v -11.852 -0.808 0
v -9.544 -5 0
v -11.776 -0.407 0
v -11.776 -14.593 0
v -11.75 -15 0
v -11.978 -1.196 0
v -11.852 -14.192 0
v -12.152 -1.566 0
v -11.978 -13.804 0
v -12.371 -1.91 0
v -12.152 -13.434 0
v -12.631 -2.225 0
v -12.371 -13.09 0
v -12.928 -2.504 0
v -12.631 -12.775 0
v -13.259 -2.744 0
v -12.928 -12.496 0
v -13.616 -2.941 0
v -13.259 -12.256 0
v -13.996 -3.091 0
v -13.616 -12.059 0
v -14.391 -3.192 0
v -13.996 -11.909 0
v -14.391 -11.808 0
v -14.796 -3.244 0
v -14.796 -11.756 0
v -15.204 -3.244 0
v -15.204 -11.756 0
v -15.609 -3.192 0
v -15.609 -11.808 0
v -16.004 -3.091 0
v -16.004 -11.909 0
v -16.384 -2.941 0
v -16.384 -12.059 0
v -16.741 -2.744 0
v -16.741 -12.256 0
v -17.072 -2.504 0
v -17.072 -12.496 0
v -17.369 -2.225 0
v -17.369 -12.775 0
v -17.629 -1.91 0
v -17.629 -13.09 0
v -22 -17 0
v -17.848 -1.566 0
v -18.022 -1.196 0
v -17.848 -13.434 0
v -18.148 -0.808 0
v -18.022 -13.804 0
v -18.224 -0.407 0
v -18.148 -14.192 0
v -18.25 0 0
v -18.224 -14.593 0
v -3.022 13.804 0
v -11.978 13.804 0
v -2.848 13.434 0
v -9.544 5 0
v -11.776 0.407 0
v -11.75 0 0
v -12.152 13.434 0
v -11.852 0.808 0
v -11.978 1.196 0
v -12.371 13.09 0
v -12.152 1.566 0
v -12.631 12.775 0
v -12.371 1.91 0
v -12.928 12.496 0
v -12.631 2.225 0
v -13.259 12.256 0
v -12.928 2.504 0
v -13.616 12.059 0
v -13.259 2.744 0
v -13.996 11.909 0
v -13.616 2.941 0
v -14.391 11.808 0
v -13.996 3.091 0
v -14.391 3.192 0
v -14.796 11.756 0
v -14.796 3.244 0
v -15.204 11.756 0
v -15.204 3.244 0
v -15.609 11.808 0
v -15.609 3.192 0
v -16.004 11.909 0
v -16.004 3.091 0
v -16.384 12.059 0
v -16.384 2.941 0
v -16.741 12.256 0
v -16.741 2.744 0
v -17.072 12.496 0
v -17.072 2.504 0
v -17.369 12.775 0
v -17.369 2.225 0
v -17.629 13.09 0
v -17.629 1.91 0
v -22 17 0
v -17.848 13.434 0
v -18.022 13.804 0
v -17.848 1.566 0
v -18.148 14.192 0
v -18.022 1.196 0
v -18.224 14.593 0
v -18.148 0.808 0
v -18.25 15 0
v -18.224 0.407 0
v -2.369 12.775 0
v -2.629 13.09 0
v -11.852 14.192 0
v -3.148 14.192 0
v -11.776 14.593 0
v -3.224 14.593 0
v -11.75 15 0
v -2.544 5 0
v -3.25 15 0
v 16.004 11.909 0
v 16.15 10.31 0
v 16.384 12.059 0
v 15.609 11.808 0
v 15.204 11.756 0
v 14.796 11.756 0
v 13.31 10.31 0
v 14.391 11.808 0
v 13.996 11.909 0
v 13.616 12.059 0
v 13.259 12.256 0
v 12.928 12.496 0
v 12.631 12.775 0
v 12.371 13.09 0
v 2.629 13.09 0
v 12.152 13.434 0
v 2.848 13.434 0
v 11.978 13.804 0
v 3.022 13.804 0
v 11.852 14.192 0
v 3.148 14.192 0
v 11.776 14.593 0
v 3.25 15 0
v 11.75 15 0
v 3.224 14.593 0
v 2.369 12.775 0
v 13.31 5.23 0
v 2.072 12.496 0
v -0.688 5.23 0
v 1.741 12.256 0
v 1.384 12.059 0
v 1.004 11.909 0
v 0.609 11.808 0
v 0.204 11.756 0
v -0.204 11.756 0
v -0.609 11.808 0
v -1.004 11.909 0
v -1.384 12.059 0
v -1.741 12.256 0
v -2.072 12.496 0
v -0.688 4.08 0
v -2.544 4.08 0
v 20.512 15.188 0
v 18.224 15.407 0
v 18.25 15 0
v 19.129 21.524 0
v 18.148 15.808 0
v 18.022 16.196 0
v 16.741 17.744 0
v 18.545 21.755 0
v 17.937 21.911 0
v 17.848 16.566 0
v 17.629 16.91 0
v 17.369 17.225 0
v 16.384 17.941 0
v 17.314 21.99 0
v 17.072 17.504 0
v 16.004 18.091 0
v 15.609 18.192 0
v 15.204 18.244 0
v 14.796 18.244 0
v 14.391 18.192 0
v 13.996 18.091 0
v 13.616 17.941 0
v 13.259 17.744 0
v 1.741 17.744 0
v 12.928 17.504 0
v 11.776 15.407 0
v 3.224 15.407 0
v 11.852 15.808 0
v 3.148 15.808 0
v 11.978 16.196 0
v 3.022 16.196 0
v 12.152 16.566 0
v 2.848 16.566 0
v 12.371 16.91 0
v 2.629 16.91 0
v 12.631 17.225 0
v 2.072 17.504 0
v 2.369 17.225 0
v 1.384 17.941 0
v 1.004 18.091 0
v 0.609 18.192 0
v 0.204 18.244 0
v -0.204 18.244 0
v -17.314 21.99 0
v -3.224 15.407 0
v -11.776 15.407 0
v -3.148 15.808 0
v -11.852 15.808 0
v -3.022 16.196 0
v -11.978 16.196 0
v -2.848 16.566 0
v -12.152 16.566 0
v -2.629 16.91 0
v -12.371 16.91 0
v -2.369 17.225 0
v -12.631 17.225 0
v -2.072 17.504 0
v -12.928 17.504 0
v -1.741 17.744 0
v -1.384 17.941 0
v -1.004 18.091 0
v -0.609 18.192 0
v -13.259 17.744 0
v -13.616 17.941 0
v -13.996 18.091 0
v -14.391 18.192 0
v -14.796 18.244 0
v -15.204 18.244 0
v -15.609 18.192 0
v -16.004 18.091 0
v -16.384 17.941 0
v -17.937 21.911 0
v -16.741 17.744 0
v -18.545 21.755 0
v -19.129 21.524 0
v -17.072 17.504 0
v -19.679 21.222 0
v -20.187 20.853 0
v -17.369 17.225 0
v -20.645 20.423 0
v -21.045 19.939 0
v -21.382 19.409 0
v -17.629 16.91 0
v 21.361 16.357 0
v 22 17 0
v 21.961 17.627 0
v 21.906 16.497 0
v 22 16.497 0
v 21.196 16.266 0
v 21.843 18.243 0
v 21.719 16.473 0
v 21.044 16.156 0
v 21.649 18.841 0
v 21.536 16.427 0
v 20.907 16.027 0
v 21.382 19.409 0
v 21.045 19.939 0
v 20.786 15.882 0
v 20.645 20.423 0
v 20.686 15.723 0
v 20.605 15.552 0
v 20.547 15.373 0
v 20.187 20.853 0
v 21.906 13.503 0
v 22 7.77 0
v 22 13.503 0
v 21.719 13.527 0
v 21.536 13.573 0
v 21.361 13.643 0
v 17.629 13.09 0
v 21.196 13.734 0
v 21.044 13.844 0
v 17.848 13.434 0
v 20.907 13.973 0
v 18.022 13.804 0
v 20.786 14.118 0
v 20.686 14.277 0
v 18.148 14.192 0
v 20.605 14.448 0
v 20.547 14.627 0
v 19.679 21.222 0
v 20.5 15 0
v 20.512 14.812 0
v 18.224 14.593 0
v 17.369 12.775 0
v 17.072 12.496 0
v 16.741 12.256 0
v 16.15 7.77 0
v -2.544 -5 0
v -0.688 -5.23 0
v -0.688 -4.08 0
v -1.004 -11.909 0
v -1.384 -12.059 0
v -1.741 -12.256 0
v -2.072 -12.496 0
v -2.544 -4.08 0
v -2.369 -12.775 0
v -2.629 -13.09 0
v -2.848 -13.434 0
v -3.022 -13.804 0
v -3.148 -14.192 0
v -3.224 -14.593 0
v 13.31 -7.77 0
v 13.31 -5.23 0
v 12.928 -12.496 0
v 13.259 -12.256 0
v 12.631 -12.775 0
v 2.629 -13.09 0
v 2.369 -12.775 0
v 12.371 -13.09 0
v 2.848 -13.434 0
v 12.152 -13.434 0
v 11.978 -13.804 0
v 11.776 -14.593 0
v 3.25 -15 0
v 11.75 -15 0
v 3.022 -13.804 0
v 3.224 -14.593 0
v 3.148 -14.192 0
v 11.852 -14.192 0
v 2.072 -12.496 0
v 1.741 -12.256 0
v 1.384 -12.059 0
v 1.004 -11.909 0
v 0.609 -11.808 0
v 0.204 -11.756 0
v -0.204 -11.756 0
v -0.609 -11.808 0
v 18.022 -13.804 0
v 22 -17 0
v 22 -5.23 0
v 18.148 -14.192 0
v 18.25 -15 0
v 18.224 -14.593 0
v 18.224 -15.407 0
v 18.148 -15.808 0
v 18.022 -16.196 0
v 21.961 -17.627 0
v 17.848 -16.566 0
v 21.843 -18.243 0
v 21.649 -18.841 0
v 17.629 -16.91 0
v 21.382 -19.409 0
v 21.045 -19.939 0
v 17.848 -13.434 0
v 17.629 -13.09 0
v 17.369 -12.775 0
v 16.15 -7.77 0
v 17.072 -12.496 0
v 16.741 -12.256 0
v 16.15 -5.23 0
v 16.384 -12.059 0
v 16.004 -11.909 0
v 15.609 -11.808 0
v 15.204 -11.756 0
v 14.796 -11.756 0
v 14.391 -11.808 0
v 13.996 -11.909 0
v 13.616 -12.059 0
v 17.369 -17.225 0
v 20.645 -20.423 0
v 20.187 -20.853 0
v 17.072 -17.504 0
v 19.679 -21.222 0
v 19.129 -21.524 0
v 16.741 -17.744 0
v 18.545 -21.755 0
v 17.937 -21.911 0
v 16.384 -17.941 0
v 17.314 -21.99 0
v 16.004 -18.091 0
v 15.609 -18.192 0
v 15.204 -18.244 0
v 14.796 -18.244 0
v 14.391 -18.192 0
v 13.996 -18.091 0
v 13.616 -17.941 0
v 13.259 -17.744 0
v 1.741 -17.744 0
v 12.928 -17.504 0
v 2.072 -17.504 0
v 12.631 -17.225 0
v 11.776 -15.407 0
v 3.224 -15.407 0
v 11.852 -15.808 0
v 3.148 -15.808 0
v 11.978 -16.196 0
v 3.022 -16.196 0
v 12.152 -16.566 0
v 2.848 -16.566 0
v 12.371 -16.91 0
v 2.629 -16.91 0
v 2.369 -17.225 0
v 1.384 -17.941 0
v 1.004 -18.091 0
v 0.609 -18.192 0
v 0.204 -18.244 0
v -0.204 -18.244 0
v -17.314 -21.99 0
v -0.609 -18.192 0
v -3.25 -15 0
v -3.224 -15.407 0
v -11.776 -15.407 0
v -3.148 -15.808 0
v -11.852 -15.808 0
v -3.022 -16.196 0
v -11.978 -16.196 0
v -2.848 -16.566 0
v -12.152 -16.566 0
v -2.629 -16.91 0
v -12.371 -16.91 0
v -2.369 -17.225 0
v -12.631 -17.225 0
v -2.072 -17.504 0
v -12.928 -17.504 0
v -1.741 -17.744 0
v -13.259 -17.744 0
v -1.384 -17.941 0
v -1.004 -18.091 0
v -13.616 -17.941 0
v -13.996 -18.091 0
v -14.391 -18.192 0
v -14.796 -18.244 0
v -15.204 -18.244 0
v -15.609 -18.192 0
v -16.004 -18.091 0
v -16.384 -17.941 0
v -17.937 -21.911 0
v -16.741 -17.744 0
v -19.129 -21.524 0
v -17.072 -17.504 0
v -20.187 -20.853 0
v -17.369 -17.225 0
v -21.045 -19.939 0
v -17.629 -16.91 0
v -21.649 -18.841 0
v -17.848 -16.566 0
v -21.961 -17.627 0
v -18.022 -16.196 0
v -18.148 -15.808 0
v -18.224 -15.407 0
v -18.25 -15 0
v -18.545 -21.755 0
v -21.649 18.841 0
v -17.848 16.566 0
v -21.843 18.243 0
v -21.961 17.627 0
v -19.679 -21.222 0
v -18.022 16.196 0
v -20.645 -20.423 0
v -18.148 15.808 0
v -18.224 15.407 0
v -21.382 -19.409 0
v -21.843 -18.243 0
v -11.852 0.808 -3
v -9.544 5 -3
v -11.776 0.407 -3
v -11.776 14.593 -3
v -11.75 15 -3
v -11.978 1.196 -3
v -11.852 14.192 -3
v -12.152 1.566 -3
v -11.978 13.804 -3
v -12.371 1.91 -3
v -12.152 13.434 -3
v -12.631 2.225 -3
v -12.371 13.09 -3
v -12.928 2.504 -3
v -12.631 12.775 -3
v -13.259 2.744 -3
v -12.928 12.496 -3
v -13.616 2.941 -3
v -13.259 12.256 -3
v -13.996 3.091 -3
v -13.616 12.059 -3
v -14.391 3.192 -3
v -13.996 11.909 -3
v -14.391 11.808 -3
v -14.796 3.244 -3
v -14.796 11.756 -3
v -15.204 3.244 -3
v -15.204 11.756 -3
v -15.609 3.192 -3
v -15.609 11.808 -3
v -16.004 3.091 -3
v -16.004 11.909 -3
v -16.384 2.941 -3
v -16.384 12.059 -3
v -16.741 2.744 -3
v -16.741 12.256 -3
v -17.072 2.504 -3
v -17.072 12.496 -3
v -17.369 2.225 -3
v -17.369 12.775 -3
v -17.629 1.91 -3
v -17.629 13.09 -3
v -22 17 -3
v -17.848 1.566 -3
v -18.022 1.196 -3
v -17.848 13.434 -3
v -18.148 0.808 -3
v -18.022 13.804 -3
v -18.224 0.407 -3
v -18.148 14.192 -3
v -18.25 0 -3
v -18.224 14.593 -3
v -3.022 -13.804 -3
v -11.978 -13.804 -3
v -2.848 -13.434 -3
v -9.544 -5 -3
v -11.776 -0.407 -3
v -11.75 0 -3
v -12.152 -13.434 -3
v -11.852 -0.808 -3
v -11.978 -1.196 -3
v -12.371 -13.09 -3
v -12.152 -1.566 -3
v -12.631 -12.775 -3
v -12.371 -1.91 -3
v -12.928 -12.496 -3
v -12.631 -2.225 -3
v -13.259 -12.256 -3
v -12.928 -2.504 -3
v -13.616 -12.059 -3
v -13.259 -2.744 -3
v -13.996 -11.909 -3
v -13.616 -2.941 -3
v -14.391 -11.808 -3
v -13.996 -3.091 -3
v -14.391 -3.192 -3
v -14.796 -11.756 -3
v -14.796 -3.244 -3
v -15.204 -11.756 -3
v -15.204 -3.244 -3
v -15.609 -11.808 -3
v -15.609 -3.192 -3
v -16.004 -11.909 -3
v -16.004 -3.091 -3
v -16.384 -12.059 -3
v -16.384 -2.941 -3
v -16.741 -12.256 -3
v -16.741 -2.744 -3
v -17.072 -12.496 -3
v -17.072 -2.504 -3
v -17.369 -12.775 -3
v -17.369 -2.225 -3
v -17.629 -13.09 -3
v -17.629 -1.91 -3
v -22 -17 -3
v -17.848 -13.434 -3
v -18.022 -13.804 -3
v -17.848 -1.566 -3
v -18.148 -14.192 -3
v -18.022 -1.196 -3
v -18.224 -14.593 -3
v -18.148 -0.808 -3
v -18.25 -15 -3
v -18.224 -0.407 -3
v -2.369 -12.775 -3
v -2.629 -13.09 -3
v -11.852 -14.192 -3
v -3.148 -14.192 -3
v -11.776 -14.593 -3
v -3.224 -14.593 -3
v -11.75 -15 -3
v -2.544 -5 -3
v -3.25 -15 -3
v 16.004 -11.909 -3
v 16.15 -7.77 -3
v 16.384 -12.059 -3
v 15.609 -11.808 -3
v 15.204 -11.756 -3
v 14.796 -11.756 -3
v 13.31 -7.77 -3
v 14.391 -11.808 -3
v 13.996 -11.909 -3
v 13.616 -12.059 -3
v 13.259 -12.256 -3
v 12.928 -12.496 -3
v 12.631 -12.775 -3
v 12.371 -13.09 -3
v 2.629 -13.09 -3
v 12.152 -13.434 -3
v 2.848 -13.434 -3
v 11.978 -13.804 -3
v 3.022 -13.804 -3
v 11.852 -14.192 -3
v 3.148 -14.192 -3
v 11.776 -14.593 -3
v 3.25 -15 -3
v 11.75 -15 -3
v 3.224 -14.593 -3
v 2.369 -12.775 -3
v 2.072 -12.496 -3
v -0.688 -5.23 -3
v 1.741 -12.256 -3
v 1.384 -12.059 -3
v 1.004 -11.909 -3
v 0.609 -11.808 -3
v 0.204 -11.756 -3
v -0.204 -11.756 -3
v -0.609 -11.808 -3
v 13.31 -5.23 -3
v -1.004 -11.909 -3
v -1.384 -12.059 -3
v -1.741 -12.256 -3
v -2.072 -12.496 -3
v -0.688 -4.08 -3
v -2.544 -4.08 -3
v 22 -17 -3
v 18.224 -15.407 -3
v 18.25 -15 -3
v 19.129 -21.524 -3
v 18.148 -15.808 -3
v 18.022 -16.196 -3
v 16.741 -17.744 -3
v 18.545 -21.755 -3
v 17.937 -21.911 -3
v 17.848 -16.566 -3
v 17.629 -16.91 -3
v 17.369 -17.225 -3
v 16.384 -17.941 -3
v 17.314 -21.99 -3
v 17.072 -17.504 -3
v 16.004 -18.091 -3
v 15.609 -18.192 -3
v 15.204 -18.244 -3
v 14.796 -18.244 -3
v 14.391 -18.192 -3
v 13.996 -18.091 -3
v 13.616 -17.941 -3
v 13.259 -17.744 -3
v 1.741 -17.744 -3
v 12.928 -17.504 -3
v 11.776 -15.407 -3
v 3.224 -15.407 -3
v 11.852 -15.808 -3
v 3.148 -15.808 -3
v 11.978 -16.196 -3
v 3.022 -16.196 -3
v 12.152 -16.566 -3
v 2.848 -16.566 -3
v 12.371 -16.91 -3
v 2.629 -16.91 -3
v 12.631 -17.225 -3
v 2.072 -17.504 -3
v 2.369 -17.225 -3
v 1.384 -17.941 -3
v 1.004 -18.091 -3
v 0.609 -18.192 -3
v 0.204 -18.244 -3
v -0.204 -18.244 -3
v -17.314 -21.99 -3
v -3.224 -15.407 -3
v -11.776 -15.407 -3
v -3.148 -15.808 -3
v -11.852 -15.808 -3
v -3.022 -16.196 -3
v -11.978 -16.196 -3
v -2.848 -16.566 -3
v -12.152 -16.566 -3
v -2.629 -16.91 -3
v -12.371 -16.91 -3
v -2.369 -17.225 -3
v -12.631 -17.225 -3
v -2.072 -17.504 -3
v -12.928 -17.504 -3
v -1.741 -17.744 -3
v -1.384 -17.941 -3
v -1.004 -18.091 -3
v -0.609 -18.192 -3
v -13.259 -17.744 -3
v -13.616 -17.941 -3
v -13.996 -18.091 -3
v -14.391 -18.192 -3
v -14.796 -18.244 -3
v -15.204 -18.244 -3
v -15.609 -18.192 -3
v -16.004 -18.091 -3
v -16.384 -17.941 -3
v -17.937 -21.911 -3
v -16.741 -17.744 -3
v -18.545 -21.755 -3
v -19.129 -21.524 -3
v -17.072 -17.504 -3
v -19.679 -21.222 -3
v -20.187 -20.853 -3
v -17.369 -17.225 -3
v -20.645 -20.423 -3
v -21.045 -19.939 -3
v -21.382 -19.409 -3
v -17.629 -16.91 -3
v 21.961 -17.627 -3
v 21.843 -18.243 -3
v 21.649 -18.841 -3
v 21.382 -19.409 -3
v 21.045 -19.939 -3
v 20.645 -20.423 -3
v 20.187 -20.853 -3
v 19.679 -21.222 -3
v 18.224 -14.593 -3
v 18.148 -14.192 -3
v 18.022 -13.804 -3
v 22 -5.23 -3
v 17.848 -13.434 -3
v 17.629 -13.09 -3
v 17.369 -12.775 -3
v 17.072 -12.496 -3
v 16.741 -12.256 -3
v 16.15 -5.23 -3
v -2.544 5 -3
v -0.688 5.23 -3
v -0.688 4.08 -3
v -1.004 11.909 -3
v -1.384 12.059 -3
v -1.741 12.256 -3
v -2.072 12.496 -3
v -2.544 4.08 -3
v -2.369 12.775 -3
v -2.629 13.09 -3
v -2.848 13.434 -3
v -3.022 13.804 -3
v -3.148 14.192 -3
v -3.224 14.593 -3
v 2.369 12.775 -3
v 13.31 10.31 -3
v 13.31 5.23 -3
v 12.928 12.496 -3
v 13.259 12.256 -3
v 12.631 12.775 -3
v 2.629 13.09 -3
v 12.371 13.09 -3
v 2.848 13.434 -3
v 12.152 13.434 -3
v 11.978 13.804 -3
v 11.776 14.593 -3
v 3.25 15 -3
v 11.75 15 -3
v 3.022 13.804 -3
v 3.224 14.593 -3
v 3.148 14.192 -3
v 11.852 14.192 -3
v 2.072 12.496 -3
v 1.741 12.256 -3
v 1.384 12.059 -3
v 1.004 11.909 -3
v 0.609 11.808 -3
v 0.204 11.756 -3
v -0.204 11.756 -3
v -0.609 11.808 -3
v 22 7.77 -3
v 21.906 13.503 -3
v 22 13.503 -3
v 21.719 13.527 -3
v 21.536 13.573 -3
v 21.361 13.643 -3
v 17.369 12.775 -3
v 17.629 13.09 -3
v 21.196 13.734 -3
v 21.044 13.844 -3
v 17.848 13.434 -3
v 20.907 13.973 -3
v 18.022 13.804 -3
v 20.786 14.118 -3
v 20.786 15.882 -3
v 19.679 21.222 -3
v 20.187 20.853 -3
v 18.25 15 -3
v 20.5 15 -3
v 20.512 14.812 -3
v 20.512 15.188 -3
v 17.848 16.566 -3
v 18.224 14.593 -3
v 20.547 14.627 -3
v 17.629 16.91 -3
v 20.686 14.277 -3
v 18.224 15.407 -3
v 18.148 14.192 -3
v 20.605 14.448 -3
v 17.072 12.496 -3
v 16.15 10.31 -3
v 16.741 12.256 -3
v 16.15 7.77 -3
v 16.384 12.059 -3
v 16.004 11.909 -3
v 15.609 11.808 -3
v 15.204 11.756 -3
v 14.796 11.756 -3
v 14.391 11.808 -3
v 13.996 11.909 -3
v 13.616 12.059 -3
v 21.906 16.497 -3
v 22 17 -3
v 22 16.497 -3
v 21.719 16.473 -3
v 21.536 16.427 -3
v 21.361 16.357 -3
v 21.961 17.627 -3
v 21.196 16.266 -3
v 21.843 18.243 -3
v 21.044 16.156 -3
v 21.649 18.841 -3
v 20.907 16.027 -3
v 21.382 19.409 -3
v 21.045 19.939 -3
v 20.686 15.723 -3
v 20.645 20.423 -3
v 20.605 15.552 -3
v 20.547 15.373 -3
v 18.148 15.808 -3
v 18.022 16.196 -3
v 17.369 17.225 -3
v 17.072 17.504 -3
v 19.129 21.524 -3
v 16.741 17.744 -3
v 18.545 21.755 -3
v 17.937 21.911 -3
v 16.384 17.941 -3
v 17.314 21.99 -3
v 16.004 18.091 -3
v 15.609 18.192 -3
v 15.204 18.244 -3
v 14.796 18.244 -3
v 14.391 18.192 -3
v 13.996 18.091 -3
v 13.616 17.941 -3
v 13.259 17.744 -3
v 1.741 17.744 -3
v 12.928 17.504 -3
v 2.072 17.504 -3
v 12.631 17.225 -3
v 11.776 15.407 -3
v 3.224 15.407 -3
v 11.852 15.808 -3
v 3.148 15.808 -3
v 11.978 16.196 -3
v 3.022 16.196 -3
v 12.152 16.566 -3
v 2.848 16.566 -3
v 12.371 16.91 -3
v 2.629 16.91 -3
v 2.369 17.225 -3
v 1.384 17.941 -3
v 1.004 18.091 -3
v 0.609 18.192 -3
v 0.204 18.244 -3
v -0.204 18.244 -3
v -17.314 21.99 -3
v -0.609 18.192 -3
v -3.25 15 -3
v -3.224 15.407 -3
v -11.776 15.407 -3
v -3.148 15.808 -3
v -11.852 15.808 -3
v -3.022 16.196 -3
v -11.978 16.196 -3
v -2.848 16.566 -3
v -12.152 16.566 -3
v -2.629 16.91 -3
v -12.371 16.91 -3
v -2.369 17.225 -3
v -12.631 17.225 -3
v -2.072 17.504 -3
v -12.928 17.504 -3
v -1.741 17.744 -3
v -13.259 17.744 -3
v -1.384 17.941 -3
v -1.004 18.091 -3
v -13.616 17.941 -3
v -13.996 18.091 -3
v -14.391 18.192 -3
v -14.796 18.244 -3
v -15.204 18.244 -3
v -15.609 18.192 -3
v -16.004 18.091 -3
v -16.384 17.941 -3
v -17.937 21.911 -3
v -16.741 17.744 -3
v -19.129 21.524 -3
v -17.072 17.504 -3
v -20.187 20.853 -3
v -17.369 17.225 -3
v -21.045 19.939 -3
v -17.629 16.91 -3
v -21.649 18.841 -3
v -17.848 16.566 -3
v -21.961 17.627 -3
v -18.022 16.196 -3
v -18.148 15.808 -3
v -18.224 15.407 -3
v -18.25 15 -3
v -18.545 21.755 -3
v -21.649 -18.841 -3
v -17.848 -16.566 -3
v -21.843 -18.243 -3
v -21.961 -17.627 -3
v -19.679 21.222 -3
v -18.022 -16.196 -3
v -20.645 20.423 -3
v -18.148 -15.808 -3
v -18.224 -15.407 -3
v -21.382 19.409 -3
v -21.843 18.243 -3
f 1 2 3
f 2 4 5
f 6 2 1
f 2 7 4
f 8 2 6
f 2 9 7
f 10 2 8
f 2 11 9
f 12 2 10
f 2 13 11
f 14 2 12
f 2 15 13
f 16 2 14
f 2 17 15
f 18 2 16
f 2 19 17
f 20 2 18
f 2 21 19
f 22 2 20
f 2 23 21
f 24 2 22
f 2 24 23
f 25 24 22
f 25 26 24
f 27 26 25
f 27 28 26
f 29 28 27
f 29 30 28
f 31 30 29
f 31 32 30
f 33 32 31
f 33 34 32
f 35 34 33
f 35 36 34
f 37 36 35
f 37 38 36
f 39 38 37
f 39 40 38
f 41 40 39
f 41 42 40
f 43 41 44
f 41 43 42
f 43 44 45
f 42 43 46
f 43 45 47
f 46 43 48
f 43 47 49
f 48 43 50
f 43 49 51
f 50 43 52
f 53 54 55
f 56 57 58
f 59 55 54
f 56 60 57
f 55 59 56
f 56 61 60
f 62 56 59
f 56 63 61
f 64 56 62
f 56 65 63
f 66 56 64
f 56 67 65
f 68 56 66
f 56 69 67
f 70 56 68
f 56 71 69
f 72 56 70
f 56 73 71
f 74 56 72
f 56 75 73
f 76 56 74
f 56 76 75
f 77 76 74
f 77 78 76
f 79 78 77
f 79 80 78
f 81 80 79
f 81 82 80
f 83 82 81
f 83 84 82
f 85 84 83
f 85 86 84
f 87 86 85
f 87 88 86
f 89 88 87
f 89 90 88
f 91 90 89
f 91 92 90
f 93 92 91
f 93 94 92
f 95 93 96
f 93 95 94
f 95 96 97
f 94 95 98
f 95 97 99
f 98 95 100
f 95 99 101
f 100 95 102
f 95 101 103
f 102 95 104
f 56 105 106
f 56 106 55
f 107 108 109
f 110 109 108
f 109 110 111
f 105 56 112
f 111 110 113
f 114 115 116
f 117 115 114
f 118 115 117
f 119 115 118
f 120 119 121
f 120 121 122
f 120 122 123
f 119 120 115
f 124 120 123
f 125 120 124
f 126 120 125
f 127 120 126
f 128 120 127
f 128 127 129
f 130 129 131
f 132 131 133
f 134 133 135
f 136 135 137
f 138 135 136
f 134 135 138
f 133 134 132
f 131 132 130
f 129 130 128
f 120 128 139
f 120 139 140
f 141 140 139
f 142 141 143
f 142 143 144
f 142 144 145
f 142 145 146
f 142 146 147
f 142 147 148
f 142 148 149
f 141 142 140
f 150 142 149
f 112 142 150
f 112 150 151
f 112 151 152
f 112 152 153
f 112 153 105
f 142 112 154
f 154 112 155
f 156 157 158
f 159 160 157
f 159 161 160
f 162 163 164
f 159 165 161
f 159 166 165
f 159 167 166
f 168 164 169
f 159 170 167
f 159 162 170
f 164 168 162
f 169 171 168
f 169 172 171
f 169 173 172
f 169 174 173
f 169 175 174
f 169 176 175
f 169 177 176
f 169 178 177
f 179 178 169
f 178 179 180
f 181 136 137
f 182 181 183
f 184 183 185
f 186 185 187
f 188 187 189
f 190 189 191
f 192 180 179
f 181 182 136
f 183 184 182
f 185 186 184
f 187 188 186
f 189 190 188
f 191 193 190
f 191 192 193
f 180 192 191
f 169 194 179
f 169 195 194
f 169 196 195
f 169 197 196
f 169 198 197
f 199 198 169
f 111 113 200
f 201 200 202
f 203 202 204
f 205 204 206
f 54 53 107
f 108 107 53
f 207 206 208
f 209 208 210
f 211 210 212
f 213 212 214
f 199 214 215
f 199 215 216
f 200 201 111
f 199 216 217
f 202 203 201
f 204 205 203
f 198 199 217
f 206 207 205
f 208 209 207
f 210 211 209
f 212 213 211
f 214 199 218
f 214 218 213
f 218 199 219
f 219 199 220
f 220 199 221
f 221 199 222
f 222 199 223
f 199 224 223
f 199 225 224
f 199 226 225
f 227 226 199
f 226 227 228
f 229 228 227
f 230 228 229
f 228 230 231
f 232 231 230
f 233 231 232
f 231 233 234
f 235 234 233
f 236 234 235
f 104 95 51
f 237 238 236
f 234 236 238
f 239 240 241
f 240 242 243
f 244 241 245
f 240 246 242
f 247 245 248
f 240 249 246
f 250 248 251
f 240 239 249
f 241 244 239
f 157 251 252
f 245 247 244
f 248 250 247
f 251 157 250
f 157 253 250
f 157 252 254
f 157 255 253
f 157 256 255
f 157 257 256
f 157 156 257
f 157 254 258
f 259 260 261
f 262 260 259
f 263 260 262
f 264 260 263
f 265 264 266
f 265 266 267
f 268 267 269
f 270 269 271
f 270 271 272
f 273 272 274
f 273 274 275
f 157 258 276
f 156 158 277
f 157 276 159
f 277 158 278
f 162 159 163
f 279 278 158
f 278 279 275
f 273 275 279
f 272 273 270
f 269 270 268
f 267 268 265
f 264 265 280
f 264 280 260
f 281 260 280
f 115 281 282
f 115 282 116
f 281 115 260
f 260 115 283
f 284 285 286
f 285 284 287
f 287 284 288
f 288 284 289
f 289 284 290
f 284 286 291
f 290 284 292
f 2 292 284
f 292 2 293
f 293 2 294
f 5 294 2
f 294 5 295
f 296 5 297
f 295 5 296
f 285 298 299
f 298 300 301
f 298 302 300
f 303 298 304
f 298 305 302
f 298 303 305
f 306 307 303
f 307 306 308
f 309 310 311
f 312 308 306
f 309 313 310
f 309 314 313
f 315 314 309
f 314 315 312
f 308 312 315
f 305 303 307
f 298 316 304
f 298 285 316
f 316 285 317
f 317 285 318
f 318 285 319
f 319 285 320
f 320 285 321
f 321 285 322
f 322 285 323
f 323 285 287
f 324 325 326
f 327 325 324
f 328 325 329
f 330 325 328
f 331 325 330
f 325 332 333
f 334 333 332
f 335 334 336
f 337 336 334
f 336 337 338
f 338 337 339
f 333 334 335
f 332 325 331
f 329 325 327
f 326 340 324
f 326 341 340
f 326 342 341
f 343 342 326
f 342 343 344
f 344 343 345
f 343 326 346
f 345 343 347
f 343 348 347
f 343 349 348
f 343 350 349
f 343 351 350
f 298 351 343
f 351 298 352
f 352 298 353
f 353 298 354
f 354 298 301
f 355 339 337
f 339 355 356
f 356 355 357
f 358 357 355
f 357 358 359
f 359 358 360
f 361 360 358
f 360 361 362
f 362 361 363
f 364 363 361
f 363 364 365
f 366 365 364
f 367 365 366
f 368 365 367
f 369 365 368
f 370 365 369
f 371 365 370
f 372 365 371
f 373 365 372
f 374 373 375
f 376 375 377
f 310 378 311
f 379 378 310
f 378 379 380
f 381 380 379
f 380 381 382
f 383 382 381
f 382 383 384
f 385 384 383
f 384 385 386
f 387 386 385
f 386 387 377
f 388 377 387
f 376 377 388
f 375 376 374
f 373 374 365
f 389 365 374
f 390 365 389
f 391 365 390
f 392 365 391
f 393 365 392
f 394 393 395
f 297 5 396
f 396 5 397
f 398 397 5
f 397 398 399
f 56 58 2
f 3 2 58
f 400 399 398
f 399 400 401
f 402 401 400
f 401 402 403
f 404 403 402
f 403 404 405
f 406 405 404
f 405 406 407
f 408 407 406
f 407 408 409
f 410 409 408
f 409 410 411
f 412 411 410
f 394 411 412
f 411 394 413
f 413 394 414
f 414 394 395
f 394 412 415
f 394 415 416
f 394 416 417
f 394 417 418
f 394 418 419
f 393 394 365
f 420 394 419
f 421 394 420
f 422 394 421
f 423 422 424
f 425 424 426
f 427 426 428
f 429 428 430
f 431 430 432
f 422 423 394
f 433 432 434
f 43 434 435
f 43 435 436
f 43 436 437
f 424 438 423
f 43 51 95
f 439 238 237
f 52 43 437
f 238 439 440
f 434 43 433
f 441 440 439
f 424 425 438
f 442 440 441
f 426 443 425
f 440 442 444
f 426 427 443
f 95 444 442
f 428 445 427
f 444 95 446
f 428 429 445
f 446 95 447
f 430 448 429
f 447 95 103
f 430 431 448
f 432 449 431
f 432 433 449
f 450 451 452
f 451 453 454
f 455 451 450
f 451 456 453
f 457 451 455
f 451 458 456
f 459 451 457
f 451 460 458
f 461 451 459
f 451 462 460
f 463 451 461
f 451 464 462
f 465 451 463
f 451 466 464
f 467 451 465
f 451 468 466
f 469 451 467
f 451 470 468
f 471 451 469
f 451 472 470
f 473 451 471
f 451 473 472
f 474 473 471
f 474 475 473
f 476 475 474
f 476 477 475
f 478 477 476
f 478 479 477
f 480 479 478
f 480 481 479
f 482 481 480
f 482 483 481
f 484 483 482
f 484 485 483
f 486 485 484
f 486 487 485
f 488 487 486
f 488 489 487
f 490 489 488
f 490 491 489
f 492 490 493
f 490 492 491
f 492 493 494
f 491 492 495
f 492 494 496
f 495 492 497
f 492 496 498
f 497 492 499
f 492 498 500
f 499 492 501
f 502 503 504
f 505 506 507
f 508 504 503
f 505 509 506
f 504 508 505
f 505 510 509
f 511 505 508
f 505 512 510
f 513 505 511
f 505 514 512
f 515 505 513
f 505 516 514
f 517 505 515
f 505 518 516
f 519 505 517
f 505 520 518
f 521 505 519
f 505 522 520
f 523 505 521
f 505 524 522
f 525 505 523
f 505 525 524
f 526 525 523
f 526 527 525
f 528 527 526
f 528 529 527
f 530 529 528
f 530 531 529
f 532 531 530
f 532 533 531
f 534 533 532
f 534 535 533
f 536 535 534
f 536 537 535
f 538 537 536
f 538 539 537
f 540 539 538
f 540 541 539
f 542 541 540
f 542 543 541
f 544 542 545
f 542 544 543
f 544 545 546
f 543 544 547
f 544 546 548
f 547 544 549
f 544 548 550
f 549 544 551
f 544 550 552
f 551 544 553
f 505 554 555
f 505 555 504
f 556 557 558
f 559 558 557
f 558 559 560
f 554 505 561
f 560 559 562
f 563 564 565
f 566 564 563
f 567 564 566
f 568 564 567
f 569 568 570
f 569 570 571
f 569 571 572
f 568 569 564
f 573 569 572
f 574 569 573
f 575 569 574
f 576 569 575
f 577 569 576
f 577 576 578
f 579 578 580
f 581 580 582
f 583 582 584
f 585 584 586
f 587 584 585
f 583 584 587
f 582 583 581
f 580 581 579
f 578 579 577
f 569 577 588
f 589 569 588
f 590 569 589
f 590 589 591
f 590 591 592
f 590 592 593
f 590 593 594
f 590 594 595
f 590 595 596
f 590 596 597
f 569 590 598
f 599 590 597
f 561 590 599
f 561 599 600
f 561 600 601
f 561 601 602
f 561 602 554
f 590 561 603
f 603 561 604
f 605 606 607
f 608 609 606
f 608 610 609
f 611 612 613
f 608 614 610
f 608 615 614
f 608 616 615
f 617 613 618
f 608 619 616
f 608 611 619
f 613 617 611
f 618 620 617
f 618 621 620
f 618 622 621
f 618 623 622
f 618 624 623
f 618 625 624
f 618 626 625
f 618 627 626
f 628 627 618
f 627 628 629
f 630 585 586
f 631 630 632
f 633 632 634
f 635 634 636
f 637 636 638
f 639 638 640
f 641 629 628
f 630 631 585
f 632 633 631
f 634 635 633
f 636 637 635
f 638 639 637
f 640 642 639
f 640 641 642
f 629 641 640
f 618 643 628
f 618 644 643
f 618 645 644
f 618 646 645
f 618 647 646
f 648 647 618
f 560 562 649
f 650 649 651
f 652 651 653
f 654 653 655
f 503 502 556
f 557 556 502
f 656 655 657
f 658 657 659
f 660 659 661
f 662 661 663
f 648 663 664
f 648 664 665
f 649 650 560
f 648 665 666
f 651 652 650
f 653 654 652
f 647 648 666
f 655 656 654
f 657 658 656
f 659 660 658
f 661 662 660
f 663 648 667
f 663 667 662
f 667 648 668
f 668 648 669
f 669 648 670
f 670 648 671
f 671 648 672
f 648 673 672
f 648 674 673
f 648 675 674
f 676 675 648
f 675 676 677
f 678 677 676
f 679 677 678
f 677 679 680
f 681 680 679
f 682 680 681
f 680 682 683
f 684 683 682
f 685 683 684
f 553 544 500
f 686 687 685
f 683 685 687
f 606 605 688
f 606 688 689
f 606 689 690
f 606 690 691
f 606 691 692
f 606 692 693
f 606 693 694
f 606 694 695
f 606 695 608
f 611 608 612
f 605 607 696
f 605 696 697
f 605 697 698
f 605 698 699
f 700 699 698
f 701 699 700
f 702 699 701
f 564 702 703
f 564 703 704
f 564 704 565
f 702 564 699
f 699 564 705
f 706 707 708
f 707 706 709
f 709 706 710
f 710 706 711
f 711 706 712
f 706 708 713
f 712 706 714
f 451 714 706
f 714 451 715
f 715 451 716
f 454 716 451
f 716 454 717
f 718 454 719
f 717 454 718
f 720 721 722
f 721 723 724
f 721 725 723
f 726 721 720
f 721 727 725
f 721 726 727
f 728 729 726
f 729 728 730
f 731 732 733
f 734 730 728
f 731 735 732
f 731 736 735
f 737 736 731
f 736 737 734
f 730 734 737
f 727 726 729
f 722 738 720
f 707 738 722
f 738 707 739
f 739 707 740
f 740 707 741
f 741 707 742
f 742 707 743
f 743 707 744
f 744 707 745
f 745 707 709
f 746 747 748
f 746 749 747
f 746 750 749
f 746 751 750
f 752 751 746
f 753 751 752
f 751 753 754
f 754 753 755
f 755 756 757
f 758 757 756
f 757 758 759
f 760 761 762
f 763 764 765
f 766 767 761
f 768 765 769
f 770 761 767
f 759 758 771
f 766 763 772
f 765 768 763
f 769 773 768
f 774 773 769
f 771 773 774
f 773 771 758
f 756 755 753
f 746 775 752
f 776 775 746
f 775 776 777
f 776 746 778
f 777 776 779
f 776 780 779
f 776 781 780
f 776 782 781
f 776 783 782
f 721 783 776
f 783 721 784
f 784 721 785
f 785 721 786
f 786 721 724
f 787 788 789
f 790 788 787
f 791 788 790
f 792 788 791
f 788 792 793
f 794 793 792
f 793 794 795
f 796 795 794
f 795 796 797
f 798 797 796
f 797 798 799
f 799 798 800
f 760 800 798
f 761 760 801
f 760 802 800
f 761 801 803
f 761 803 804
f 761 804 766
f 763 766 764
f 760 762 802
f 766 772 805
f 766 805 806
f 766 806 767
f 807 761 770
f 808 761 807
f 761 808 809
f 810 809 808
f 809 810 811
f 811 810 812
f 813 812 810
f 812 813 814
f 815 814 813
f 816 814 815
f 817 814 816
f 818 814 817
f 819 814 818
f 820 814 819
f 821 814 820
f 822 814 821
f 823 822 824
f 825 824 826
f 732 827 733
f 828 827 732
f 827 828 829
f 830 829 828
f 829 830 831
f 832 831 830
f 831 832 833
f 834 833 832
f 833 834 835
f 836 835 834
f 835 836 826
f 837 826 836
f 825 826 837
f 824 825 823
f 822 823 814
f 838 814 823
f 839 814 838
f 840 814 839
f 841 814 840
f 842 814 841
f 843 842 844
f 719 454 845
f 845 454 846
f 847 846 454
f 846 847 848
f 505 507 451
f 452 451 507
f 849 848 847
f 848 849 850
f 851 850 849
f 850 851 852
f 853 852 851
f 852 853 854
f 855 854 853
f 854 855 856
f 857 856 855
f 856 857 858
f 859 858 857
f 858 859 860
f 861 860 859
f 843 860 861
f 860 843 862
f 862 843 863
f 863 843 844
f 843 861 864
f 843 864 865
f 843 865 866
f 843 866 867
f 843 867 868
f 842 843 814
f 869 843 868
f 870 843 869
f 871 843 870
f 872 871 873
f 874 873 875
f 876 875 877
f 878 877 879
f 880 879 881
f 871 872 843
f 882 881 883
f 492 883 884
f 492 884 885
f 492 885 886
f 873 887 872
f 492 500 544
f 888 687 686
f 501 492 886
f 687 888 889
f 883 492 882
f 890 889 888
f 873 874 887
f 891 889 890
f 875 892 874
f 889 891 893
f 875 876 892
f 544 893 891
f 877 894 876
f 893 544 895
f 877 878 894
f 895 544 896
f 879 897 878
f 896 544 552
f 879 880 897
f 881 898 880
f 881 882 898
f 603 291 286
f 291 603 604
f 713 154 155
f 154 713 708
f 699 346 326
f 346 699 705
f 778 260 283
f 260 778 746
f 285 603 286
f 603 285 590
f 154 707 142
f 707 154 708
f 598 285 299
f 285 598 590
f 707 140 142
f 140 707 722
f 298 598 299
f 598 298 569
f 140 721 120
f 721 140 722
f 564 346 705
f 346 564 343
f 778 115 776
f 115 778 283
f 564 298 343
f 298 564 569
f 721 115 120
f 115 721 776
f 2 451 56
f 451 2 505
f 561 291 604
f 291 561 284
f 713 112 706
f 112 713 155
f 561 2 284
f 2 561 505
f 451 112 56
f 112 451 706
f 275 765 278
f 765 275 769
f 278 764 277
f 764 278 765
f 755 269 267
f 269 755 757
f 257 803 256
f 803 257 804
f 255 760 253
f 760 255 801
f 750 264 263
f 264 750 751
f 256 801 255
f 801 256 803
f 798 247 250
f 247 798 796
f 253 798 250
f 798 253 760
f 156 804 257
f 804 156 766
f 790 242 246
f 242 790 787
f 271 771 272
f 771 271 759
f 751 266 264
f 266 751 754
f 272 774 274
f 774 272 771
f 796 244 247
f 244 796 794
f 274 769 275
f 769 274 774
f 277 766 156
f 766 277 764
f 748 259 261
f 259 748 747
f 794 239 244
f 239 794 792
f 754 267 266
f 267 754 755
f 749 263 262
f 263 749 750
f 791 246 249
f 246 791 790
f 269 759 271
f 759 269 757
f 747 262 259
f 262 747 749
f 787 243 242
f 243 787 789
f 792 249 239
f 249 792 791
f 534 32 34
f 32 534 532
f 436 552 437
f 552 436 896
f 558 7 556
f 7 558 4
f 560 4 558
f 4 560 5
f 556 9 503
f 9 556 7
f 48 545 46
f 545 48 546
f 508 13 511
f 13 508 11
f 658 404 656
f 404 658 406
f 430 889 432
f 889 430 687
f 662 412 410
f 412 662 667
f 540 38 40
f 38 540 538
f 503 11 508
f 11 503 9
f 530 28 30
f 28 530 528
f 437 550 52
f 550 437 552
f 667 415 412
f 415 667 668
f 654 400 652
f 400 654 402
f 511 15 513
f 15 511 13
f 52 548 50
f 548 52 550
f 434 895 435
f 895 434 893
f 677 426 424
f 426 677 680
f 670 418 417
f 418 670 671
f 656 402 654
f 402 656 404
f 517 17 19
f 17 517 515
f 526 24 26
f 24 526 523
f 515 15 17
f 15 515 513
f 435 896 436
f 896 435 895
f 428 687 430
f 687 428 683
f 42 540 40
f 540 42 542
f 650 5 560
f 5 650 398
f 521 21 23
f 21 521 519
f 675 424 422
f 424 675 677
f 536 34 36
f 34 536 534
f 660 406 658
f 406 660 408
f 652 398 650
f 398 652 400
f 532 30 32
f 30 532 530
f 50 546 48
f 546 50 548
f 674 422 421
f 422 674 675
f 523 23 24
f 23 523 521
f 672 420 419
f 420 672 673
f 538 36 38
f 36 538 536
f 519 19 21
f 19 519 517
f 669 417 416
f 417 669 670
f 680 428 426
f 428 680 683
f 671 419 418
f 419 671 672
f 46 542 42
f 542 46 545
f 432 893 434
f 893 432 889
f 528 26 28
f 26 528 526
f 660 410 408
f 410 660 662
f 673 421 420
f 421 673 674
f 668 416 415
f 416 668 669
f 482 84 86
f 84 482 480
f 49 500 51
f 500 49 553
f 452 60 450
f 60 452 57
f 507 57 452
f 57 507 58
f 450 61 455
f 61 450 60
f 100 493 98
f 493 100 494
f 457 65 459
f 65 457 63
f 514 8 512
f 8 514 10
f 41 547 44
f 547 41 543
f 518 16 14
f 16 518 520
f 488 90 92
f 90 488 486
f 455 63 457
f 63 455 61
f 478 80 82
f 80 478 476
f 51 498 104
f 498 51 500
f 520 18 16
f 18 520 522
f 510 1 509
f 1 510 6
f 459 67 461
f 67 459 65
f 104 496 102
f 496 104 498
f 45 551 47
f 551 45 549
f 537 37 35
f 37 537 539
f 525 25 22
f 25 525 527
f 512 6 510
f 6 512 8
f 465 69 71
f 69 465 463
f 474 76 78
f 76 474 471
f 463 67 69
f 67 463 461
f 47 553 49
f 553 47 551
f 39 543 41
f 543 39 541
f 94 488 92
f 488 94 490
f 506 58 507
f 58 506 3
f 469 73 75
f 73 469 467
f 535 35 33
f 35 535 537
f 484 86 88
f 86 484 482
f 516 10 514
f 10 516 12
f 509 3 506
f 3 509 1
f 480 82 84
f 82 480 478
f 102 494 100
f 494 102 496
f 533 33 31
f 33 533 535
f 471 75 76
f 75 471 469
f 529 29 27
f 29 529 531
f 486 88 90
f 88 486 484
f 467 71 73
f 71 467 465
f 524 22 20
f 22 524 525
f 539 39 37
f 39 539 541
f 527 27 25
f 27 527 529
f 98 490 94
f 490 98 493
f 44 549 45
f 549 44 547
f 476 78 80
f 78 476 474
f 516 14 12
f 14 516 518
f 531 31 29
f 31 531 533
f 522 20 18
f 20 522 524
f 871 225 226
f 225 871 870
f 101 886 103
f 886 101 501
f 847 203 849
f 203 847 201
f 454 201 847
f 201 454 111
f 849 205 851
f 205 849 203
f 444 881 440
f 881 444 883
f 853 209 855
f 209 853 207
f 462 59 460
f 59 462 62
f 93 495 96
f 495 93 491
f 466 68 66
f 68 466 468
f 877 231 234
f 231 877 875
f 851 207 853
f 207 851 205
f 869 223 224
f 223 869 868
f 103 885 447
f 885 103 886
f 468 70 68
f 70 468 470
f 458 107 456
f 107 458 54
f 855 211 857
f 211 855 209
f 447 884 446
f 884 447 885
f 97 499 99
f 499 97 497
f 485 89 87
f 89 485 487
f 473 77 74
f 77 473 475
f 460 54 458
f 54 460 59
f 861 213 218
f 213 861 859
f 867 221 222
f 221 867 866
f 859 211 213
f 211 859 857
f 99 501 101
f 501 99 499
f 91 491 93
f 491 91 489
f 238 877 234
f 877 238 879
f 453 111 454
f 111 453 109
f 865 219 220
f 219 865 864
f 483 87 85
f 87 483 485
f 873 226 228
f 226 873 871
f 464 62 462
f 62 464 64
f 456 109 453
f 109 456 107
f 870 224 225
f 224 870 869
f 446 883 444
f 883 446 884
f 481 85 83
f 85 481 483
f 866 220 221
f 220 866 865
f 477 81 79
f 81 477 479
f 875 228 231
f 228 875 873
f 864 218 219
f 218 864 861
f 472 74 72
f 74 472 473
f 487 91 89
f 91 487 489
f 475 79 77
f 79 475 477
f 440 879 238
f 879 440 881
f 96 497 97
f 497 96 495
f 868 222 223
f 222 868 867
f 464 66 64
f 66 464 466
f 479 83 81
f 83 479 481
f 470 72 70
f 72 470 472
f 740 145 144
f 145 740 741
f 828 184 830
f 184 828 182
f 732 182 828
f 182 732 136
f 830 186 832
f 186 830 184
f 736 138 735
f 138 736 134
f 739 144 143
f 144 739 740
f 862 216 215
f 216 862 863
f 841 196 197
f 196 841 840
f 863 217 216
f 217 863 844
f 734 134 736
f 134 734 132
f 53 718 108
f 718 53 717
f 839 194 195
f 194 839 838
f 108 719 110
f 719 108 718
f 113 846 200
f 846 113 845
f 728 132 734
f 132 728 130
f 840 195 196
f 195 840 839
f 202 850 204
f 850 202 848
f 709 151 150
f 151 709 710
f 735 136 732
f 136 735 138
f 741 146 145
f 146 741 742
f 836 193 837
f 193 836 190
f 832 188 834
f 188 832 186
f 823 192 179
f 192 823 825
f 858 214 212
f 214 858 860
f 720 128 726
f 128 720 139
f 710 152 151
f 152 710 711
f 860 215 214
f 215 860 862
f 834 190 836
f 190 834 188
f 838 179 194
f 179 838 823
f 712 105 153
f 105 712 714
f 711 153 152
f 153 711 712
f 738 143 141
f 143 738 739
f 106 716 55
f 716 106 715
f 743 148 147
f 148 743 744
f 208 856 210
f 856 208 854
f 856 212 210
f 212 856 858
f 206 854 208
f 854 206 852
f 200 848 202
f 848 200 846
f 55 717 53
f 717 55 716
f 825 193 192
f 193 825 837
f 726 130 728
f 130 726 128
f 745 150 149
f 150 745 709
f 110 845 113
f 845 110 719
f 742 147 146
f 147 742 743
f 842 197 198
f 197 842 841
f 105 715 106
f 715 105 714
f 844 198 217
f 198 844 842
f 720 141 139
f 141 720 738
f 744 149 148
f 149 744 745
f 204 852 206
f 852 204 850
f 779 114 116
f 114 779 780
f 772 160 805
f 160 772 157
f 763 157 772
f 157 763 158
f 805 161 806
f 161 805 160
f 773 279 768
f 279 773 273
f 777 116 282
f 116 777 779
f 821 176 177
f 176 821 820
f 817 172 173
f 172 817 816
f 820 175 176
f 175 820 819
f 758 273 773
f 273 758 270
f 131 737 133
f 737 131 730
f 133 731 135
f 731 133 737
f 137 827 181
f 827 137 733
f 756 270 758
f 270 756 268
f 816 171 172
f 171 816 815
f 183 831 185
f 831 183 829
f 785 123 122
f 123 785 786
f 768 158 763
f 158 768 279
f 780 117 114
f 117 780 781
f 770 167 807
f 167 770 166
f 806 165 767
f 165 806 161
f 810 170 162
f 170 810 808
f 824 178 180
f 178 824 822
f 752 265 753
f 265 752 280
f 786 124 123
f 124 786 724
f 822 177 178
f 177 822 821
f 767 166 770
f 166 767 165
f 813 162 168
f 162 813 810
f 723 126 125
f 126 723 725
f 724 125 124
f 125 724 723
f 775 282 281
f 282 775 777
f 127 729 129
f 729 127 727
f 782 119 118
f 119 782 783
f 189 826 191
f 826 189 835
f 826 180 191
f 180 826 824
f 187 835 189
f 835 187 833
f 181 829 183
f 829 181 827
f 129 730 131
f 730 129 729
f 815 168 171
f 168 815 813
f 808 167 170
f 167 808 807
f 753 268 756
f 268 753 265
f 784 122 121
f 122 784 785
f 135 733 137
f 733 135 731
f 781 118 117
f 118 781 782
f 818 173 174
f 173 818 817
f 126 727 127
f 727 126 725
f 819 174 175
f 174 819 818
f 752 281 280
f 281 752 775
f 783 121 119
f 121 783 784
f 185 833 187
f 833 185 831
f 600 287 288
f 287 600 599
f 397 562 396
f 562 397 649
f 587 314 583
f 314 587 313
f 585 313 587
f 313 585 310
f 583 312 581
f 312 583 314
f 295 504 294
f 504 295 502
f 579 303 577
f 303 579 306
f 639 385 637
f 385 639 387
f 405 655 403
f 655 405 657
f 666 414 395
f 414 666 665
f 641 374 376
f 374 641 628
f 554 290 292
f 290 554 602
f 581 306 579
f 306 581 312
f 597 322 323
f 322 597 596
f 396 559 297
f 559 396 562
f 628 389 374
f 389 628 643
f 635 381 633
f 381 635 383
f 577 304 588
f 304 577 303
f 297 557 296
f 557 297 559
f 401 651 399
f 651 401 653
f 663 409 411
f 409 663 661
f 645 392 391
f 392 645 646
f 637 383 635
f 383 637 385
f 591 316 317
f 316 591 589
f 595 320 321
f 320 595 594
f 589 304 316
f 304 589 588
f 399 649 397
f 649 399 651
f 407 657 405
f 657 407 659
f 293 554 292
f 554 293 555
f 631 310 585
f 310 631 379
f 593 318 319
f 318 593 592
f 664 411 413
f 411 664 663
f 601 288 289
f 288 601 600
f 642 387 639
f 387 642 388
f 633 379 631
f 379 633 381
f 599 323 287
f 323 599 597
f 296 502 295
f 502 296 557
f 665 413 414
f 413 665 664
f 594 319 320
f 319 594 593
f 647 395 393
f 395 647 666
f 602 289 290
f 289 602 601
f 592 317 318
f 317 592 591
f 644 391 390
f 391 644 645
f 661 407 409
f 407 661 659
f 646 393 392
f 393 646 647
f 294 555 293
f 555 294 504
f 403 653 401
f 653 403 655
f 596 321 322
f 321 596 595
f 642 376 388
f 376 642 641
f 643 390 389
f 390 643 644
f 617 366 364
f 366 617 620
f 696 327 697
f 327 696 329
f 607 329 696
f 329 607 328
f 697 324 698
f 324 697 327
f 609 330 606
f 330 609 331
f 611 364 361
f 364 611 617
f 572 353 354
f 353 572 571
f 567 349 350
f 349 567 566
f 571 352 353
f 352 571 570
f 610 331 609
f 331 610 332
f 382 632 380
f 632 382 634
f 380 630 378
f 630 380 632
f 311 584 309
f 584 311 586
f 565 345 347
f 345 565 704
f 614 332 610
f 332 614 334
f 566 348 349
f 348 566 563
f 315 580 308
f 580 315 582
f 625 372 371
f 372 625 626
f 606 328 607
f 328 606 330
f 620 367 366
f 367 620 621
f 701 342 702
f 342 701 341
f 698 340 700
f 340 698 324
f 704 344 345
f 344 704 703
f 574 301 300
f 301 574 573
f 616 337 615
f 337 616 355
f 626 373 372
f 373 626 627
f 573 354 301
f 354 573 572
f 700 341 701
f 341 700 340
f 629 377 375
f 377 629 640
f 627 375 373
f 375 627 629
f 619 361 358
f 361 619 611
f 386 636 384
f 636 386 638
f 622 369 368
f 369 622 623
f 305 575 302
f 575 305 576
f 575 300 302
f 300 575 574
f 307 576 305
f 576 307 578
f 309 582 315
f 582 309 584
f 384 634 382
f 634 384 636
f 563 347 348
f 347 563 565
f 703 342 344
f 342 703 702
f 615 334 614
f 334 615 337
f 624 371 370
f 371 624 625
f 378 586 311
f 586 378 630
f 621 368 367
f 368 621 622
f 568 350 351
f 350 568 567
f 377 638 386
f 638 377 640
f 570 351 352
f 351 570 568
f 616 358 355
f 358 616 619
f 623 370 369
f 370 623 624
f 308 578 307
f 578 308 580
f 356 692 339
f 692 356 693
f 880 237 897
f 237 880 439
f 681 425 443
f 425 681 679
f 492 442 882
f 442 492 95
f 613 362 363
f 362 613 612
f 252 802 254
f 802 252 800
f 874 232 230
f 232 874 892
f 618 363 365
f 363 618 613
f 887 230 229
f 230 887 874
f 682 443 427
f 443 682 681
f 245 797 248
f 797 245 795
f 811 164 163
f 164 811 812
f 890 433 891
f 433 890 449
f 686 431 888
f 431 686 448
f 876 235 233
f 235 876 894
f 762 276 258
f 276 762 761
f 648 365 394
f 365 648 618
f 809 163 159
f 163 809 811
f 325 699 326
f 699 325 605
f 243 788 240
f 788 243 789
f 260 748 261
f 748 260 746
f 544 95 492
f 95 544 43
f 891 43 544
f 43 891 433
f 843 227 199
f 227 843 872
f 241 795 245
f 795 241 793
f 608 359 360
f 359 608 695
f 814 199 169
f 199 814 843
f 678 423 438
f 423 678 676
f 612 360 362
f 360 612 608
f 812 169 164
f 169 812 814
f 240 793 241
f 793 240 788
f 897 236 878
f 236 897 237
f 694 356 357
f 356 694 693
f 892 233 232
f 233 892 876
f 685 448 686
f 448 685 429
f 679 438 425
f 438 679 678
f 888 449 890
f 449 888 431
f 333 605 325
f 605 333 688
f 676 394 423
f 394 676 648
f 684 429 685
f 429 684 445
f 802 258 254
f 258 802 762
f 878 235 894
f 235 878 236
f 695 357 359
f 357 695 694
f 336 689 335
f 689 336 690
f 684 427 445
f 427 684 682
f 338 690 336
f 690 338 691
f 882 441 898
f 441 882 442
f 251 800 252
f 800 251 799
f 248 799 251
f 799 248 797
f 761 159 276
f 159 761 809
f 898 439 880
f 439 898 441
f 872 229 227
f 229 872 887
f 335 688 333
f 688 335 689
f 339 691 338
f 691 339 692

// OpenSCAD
$fn = 50;


difference() {
	union() {
		*color(alpha = 1.0000000000, c = "gray") {
			translate(v = [0, 14, -3]) {
				linear_extrude(height = 3) {
					text(font = "Arial:style=Bold", halign = "center", size = 4.5000000000, text = "COMMENT description oobb_plate_shape_positive_type_3_depth_0_0_-3_pos_i2c_extra_3_thickness_3_width_3_height_0_0_-3_pos_plate", valign = "center");
				}
			}
		}
		translate(v = [0, 0, -3]) {
			hull() {
				translate(v = [-17.0000000000, 17.0000000000, 0]) {
					cylinder(h = 3, r = 5);
				}
				translate(v = [17.0000000000, 17.0000000000, 0]) {
					cylinder(h = 3, r = 5);
				}
				translate(v = [-17.0000000000, -17.0000000000, 0]) {
					cylinder(h = 3, r = 5);
				}
				translate(v = [17.0000000000, -17.0000000000, 0]) {
					cylinder(h = 3, r = 5);
				}
			}
		}
		*color(alpha = 1.0000000000, c = "gray") {
			translate(v = [0, 14, -3]) {
				linear_extrude(height = 3) {
					text(font = "Arial:style=Bold", halign = "center", size = 4.5000000000, text = "COMMENT description oobb_holes_shape_p_type_0_0_-3_pos_i2c_extra_3_thickness_3_width_3_height_0_0_-3_pos_plate_'left'_'right'_'top'_hole_sides_'left'_'right'_'top'_holes_true_both_holes", valign = "center");
				}
			}
		}
		*color(alpha = 1.0000000000, c = "gray") {
			translate(v = [0, 14, -3]) {
				rotate(a = [0, 0, 180]) {
					linear_extrude(height = 3) {
						text(font = "Arial:style=Bold", halign = "center", size = 4.5000000000, text = "COMMENT description oobb_wire_i2c_shape_0_0_-3_pos_i2c_extra_3_thickness_3_width_3_height_0_0_-3_pos_plate_0_0_180_rot", valign = "center");
					}
				}
			}
		}
	}
	union() {
		translate(v = [22.5000000000, 0, -3]) {
			rotate(a = [0, 0, 180]) {
				difference() {
					union() {
						translate(v = [23.0670000000, -4.0800000000, 0]) {
							cube(size = [5, 8.1600000000, 3]);
						}
						translate(v = [0.2040000000, -7.7700000000, 0]) {
							cube(size = [6.3000000000, 13.0000000000, 3]);
						}
						translate(v = [8.8880000000, -5.2300000000, 0]) {
							cube(size = [14.3000000000, 10.4600000000, 3]);
						}
						translate(v = [6.3500000000, -10.3100000000, 0]) {
							cube(size = [2.8400000000, 18.0800000000, 3]);
						}
						translate(v = [25.0440000000, -5.0000000000, 0]) {
							cube(size = [7, 10, 3]);
						}
						translate(v = [0.5000000000, -15, 0.0000000000]) {
							cylinder(h = 3, r = 1.5000000000);
						}
					}
					union();
				}
			}
		}
		translate(v = [-15.0000000000, -15.0000000000, -50.0000000000]) {
			cylinder(h = 100, r = 3.2500000000);
		}
		translate(v = [-15.0000000000, 0.0000000000, -50.0000000000]) {
			cylinder(h = 100, r = 3.2500000000);
		}
		translate(v = [-15.0000000000, 15.0000000000, -50.0000000000]) {
			cylinder(h = 100, r = 3.2500000000);
		}
		translate(v = [-15.0000000000, 15.0000000000, -50.0000000000]) {
			cylinder(h = 100, r = 3.2500000000);
		}
		translate(v = [0.0000000000, 15.0000000000, -50.0000000000]) {
			cylinder(h = 100, r = 3.2500000000);
		}
		translate(v = [15.0000000000, 15.0000000000, -50.0000000000]) {
			cylinder(h = 100, r = 3.2500000000);
		}
		translate(v = [-15.0000000000, -15.0000000000, -50.0000000000]) {
			cylinder(h = 100, r = 3.2500000000);
		}
		translate(v = [0.0000000000, -15.0000000000, -50.0000000000]) {
			cylinder(h = 100, r = 3.2500000000);
		}
		translate(v = [15.0000000000, -15.0000000000, -50.0000000000]) {
			cylinder(h = 100, r = 3.2500000000);
		}
	}
}
